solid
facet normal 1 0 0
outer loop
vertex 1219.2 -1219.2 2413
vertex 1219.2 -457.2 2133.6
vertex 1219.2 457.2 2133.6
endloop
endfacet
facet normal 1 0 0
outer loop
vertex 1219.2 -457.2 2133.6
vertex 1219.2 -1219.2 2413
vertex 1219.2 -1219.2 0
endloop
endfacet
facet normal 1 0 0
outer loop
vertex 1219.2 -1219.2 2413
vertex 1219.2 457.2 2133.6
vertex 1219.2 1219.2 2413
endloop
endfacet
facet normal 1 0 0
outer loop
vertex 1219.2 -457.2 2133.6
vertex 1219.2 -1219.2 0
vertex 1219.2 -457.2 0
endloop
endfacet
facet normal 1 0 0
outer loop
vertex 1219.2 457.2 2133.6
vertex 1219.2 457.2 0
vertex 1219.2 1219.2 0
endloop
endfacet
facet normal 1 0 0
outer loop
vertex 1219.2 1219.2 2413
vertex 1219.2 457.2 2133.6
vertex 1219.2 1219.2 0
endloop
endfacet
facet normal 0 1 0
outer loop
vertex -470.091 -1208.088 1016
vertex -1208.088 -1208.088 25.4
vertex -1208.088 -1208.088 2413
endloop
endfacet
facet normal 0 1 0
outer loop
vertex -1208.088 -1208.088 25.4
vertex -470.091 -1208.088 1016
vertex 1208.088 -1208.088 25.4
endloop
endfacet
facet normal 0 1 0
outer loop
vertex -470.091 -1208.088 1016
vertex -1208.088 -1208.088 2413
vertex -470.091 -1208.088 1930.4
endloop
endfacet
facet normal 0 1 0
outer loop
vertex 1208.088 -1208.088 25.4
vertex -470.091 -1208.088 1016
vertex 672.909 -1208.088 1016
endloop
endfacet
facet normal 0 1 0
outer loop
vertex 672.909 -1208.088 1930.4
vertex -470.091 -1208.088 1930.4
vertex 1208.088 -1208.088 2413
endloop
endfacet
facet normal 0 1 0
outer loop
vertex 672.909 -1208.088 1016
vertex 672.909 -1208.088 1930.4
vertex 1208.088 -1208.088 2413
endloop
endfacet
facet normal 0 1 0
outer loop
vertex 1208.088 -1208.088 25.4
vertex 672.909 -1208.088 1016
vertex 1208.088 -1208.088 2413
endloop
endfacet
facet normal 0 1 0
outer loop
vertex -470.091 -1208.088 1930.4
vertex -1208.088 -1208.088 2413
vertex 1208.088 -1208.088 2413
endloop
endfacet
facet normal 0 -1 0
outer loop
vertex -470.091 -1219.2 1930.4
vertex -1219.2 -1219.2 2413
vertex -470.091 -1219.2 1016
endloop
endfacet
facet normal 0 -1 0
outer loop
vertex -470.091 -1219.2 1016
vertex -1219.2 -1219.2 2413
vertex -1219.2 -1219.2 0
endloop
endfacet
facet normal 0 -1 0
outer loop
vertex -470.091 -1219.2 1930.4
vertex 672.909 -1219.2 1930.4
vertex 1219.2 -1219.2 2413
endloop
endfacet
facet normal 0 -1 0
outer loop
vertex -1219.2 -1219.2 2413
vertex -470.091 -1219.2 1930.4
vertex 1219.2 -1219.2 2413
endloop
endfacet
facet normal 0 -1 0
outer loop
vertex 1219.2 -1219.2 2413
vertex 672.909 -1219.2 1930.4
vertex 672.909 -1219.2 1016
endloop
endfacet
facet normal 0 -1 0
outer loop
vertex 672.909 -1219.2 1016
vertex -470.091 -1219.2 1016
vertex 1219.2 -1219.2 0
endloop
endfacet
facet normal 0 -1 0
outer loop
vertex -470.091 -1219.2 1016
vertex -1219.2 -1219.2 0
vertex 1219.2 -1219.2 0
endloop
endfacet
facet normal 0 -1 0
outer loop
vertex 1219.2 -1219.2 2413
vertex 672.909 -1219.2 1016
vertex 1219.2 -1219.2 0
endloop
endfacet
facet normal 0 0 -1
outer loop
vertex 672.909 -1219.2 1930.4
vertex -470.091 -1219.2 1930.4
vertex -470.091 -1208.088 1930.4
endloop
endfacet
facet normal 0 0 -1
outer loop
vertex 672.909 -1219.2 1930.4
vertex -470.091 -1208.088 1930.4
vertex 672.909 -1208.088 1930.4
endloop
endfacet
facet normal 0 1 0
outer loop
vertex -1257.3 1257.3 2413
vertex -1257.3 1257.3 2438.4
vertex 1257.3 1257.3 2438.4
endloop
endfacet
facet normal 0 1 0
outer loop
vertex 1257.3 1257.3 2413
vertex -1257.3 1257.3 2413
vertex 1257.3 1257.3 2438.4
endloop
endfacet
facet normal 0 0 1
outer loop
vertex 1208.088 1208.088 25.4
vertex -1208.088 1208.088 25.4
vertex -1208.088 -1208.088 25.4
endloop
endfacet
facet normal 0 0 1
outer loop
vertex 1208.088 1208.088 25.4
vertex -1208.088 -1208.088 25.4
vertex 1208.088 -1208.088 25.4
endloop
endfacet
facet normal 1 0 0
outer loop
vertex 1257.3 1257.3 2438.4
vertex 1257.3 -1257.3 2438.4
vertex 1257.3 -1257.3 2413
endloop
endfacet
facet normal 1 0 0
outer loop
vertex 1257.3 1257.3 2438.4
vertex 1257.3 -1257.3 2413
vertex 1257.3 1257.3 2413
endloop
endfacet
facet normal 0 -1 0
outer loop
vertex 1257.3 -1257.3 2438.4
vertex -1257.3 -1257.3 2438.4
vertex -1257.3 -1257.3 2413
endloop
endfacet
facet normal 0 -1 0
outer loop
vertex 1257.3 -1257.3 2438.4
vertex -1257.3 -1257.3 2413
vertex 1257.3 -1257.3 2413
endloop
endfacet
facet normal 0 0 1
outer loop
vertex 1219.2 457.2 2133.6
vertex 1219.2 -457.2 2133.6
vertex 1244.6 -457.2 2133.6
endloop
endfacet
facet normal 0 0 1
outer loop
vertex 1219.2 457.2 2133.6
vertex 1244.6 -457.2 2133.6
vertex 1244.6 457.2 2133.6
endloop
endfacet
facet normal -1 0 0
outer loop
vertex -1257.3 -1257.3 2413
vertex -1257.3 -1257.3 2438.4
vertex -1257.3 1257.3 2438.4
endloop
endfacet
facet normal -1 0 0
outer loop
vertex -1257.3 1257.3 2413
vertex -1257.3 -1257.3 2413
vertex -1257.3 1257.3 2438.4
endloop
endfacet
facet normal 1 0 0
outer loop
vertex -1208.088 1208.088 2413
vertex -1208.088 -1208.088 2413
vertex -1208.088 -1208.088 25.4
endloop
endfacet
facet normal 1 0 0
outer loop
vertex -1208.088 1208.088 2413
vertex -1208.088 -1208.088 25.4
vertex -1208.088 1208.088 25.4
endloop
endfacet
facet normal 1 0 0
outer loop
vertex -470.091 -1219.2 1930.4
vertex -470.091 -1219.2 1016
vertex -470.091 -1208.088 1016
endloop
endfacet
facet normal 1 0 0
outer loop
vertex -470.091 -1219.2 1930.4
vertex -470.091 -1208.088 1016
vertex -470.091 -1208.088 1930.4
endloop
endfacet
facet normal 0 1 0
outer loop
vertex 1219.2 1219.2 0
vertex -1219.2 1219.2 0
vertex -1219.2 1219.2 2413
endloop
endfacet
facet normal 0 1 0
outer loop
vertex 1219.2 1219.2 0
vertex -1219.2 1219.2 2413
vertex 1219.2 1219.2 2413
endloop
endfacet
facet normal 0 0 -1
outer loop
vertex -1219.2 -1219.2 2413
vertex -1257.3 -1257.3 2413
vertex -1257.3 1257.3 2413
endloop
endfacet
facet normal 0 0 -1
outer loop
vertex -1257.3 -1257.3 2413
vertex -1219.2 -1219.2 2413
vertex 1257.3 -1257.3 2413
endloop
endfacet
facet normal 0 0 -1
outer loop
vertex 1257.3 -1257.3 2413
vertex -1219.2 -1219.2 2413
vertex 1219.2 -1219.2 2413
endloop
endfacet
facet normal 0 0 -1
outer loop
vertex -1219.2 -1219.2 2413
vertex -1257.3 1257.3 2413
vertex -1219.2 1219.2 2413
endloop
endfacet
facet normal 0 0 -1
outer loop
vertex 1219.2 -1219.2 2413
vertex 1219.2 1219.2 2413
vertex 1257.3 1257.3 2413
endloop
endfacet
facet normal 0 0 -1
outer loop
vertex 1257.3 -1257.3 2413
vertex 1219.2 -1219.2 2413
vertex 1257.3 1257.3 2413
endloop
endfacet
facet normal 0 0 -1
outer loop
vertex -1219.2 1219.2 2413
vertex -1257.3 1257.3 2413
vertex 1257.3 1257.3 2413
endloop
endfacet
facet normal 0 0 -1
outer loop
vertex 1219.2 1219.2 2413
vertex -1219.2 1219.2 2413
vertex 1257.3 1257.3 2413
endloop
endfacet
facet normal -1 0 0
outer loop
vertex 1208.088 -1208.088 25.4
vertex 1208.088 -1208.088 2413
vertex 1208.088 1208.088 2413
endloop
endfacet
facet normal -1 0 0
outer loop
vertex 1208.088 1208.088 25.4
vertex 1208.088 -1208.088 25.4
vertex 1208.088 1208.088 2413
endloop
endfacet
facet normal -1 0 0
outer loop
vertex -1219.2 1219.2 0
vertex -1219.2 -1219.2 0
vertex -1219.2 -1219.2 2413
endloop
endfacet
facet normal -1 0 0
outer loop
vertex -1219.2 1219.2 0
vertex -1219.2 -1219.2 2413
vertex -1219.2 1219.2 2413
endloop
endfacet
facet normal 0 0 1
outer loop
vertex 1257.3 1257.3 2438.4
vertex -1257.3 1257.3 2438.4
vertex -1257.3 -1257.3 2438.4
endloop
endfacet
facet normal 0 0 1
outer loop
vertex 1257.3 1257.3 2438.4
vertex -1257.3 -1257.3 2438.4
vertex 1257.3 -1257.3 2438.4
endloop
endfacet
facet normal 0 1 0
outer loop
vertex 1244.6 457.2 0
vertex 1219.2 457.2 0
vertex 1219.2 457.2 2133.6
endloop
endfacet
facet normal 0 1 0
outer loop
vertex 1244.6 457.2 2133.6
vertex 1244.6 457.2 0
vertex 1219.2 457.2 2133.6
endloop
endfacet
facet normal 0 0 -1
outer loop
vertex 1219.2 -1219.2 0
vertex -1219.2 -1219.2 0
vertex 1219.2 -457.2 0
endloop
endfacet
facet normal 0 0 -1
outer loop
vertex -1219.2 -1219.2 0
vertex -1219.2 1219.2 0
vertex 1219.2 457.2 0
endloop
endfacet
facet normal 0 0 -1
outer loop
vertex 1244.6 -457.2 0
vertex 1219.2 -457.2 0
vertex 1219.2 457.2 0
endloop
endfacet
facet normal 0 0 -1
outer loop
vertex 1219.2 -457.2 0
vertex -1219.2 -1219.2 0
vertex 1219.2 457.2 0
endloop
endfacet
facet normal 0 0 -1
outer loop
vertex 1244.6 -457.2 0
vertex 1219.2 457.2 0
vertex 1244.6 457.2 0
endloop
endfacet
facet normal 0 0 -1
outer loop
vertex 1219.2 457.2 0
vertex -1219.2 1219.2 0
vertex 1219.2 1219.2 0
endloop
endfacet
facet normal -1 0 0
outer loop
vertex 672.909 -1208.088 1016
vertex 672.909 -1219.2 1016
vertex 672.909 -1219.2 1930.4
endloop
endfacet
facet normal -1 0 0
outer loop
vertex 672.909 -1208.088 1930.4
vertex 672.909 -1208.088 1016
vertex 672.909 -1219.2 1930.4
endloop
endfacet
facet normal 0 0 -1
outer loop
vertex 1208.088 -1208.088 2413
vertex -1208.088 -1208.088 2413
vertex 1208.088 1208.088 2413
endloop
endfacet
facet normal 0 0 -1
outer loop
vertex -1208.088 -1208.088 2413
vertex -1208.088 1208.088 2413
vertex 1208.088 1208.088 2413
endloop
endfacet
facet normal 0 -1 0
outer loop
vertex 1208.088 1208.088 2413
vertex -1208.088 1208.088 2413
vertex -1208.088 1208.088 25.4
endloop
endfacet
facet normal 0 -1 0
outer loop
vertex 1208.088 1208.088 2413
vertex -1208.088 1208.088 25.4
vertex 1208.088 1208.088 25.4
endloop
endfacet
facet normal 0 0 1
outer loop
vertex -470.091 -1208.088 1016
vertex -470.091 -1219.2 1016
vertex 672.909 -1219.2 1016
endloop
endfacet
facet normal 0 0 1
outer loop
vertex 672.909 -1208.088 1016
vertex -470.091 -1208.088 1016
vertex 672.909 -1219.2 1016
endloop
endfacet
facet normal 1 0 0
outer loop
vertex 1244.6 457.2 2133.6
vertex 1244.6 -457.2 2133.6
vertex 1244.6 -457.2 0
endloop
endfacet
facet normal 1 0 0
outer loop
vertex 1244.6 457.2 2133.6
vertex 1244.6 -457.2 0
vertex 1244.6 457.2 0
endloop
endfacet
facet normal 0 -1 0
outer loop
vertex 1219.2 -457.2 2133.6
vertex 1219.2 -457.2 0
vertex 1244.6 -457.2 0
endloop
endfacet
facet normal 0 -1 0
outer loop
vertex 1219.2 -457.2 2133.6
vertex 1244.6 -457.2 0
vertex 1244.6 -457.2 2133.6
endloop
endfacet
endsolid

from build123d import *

# Parameters (mm, degrees)
F0_W     = 2438.4
F0_H     = 2438.4
F1_DEPTH = 2438.4
F2_W     = 2416.175
F2_H     = 2416.175
F3_DEPTH = 2413
F4_W     = 914.4
F4_H     = 2133.6
F5_DEPTH = 25.4
F6_W     = 1143
F6_H     = 914.4
F7_DEPTH = 25.4
F8_W     = 2514.6
F8_H     = 2514.6
F9_DEPTH = 25.4


with BuildPart() as f1:
    # F0 (on Top) → F1 (new body)
    with BuildSketch(Plane.XY):
        Rectangle(F0_W, F0_H)
    extrude(amount=F1_DEPTH)

    # F2 (on face) → F3 (cut)
    with BuildSketch(Plane.XY.offset(2438.4)):
        Rectangle(F2_W, F2_H)
    extrude(amount=-F3_DEPTH, mode=Mode.SUBTRACT)

    # F4 (on face) → F5 (join)
    with BuildSketch(Plane.YZ.offset(1219.2)):
        with Locations((0, 1066.8)):
            Rectangle(F4_W, F4_H)
    extrude(amount=F5_DEPTH)

    # F6 (on face) → F7 (cut)
    with BuildSketch(Plane.XZ.offset(1219.2)):
        with Locations((101.408737, 1473.2)):
            Rectangle(F6_W, F6_H)
    extrude(amount=-F7_DEPTH, mode=Mode.SUBTRACT)

    # F8 (on face) → F9 (join)
    with BuildSketch(Plane.XY.offset(2438.4)):
        Rectangle(F8_W, F8_H)
    extrude(amount=-F9_DEPTH)


solid = f1.part
